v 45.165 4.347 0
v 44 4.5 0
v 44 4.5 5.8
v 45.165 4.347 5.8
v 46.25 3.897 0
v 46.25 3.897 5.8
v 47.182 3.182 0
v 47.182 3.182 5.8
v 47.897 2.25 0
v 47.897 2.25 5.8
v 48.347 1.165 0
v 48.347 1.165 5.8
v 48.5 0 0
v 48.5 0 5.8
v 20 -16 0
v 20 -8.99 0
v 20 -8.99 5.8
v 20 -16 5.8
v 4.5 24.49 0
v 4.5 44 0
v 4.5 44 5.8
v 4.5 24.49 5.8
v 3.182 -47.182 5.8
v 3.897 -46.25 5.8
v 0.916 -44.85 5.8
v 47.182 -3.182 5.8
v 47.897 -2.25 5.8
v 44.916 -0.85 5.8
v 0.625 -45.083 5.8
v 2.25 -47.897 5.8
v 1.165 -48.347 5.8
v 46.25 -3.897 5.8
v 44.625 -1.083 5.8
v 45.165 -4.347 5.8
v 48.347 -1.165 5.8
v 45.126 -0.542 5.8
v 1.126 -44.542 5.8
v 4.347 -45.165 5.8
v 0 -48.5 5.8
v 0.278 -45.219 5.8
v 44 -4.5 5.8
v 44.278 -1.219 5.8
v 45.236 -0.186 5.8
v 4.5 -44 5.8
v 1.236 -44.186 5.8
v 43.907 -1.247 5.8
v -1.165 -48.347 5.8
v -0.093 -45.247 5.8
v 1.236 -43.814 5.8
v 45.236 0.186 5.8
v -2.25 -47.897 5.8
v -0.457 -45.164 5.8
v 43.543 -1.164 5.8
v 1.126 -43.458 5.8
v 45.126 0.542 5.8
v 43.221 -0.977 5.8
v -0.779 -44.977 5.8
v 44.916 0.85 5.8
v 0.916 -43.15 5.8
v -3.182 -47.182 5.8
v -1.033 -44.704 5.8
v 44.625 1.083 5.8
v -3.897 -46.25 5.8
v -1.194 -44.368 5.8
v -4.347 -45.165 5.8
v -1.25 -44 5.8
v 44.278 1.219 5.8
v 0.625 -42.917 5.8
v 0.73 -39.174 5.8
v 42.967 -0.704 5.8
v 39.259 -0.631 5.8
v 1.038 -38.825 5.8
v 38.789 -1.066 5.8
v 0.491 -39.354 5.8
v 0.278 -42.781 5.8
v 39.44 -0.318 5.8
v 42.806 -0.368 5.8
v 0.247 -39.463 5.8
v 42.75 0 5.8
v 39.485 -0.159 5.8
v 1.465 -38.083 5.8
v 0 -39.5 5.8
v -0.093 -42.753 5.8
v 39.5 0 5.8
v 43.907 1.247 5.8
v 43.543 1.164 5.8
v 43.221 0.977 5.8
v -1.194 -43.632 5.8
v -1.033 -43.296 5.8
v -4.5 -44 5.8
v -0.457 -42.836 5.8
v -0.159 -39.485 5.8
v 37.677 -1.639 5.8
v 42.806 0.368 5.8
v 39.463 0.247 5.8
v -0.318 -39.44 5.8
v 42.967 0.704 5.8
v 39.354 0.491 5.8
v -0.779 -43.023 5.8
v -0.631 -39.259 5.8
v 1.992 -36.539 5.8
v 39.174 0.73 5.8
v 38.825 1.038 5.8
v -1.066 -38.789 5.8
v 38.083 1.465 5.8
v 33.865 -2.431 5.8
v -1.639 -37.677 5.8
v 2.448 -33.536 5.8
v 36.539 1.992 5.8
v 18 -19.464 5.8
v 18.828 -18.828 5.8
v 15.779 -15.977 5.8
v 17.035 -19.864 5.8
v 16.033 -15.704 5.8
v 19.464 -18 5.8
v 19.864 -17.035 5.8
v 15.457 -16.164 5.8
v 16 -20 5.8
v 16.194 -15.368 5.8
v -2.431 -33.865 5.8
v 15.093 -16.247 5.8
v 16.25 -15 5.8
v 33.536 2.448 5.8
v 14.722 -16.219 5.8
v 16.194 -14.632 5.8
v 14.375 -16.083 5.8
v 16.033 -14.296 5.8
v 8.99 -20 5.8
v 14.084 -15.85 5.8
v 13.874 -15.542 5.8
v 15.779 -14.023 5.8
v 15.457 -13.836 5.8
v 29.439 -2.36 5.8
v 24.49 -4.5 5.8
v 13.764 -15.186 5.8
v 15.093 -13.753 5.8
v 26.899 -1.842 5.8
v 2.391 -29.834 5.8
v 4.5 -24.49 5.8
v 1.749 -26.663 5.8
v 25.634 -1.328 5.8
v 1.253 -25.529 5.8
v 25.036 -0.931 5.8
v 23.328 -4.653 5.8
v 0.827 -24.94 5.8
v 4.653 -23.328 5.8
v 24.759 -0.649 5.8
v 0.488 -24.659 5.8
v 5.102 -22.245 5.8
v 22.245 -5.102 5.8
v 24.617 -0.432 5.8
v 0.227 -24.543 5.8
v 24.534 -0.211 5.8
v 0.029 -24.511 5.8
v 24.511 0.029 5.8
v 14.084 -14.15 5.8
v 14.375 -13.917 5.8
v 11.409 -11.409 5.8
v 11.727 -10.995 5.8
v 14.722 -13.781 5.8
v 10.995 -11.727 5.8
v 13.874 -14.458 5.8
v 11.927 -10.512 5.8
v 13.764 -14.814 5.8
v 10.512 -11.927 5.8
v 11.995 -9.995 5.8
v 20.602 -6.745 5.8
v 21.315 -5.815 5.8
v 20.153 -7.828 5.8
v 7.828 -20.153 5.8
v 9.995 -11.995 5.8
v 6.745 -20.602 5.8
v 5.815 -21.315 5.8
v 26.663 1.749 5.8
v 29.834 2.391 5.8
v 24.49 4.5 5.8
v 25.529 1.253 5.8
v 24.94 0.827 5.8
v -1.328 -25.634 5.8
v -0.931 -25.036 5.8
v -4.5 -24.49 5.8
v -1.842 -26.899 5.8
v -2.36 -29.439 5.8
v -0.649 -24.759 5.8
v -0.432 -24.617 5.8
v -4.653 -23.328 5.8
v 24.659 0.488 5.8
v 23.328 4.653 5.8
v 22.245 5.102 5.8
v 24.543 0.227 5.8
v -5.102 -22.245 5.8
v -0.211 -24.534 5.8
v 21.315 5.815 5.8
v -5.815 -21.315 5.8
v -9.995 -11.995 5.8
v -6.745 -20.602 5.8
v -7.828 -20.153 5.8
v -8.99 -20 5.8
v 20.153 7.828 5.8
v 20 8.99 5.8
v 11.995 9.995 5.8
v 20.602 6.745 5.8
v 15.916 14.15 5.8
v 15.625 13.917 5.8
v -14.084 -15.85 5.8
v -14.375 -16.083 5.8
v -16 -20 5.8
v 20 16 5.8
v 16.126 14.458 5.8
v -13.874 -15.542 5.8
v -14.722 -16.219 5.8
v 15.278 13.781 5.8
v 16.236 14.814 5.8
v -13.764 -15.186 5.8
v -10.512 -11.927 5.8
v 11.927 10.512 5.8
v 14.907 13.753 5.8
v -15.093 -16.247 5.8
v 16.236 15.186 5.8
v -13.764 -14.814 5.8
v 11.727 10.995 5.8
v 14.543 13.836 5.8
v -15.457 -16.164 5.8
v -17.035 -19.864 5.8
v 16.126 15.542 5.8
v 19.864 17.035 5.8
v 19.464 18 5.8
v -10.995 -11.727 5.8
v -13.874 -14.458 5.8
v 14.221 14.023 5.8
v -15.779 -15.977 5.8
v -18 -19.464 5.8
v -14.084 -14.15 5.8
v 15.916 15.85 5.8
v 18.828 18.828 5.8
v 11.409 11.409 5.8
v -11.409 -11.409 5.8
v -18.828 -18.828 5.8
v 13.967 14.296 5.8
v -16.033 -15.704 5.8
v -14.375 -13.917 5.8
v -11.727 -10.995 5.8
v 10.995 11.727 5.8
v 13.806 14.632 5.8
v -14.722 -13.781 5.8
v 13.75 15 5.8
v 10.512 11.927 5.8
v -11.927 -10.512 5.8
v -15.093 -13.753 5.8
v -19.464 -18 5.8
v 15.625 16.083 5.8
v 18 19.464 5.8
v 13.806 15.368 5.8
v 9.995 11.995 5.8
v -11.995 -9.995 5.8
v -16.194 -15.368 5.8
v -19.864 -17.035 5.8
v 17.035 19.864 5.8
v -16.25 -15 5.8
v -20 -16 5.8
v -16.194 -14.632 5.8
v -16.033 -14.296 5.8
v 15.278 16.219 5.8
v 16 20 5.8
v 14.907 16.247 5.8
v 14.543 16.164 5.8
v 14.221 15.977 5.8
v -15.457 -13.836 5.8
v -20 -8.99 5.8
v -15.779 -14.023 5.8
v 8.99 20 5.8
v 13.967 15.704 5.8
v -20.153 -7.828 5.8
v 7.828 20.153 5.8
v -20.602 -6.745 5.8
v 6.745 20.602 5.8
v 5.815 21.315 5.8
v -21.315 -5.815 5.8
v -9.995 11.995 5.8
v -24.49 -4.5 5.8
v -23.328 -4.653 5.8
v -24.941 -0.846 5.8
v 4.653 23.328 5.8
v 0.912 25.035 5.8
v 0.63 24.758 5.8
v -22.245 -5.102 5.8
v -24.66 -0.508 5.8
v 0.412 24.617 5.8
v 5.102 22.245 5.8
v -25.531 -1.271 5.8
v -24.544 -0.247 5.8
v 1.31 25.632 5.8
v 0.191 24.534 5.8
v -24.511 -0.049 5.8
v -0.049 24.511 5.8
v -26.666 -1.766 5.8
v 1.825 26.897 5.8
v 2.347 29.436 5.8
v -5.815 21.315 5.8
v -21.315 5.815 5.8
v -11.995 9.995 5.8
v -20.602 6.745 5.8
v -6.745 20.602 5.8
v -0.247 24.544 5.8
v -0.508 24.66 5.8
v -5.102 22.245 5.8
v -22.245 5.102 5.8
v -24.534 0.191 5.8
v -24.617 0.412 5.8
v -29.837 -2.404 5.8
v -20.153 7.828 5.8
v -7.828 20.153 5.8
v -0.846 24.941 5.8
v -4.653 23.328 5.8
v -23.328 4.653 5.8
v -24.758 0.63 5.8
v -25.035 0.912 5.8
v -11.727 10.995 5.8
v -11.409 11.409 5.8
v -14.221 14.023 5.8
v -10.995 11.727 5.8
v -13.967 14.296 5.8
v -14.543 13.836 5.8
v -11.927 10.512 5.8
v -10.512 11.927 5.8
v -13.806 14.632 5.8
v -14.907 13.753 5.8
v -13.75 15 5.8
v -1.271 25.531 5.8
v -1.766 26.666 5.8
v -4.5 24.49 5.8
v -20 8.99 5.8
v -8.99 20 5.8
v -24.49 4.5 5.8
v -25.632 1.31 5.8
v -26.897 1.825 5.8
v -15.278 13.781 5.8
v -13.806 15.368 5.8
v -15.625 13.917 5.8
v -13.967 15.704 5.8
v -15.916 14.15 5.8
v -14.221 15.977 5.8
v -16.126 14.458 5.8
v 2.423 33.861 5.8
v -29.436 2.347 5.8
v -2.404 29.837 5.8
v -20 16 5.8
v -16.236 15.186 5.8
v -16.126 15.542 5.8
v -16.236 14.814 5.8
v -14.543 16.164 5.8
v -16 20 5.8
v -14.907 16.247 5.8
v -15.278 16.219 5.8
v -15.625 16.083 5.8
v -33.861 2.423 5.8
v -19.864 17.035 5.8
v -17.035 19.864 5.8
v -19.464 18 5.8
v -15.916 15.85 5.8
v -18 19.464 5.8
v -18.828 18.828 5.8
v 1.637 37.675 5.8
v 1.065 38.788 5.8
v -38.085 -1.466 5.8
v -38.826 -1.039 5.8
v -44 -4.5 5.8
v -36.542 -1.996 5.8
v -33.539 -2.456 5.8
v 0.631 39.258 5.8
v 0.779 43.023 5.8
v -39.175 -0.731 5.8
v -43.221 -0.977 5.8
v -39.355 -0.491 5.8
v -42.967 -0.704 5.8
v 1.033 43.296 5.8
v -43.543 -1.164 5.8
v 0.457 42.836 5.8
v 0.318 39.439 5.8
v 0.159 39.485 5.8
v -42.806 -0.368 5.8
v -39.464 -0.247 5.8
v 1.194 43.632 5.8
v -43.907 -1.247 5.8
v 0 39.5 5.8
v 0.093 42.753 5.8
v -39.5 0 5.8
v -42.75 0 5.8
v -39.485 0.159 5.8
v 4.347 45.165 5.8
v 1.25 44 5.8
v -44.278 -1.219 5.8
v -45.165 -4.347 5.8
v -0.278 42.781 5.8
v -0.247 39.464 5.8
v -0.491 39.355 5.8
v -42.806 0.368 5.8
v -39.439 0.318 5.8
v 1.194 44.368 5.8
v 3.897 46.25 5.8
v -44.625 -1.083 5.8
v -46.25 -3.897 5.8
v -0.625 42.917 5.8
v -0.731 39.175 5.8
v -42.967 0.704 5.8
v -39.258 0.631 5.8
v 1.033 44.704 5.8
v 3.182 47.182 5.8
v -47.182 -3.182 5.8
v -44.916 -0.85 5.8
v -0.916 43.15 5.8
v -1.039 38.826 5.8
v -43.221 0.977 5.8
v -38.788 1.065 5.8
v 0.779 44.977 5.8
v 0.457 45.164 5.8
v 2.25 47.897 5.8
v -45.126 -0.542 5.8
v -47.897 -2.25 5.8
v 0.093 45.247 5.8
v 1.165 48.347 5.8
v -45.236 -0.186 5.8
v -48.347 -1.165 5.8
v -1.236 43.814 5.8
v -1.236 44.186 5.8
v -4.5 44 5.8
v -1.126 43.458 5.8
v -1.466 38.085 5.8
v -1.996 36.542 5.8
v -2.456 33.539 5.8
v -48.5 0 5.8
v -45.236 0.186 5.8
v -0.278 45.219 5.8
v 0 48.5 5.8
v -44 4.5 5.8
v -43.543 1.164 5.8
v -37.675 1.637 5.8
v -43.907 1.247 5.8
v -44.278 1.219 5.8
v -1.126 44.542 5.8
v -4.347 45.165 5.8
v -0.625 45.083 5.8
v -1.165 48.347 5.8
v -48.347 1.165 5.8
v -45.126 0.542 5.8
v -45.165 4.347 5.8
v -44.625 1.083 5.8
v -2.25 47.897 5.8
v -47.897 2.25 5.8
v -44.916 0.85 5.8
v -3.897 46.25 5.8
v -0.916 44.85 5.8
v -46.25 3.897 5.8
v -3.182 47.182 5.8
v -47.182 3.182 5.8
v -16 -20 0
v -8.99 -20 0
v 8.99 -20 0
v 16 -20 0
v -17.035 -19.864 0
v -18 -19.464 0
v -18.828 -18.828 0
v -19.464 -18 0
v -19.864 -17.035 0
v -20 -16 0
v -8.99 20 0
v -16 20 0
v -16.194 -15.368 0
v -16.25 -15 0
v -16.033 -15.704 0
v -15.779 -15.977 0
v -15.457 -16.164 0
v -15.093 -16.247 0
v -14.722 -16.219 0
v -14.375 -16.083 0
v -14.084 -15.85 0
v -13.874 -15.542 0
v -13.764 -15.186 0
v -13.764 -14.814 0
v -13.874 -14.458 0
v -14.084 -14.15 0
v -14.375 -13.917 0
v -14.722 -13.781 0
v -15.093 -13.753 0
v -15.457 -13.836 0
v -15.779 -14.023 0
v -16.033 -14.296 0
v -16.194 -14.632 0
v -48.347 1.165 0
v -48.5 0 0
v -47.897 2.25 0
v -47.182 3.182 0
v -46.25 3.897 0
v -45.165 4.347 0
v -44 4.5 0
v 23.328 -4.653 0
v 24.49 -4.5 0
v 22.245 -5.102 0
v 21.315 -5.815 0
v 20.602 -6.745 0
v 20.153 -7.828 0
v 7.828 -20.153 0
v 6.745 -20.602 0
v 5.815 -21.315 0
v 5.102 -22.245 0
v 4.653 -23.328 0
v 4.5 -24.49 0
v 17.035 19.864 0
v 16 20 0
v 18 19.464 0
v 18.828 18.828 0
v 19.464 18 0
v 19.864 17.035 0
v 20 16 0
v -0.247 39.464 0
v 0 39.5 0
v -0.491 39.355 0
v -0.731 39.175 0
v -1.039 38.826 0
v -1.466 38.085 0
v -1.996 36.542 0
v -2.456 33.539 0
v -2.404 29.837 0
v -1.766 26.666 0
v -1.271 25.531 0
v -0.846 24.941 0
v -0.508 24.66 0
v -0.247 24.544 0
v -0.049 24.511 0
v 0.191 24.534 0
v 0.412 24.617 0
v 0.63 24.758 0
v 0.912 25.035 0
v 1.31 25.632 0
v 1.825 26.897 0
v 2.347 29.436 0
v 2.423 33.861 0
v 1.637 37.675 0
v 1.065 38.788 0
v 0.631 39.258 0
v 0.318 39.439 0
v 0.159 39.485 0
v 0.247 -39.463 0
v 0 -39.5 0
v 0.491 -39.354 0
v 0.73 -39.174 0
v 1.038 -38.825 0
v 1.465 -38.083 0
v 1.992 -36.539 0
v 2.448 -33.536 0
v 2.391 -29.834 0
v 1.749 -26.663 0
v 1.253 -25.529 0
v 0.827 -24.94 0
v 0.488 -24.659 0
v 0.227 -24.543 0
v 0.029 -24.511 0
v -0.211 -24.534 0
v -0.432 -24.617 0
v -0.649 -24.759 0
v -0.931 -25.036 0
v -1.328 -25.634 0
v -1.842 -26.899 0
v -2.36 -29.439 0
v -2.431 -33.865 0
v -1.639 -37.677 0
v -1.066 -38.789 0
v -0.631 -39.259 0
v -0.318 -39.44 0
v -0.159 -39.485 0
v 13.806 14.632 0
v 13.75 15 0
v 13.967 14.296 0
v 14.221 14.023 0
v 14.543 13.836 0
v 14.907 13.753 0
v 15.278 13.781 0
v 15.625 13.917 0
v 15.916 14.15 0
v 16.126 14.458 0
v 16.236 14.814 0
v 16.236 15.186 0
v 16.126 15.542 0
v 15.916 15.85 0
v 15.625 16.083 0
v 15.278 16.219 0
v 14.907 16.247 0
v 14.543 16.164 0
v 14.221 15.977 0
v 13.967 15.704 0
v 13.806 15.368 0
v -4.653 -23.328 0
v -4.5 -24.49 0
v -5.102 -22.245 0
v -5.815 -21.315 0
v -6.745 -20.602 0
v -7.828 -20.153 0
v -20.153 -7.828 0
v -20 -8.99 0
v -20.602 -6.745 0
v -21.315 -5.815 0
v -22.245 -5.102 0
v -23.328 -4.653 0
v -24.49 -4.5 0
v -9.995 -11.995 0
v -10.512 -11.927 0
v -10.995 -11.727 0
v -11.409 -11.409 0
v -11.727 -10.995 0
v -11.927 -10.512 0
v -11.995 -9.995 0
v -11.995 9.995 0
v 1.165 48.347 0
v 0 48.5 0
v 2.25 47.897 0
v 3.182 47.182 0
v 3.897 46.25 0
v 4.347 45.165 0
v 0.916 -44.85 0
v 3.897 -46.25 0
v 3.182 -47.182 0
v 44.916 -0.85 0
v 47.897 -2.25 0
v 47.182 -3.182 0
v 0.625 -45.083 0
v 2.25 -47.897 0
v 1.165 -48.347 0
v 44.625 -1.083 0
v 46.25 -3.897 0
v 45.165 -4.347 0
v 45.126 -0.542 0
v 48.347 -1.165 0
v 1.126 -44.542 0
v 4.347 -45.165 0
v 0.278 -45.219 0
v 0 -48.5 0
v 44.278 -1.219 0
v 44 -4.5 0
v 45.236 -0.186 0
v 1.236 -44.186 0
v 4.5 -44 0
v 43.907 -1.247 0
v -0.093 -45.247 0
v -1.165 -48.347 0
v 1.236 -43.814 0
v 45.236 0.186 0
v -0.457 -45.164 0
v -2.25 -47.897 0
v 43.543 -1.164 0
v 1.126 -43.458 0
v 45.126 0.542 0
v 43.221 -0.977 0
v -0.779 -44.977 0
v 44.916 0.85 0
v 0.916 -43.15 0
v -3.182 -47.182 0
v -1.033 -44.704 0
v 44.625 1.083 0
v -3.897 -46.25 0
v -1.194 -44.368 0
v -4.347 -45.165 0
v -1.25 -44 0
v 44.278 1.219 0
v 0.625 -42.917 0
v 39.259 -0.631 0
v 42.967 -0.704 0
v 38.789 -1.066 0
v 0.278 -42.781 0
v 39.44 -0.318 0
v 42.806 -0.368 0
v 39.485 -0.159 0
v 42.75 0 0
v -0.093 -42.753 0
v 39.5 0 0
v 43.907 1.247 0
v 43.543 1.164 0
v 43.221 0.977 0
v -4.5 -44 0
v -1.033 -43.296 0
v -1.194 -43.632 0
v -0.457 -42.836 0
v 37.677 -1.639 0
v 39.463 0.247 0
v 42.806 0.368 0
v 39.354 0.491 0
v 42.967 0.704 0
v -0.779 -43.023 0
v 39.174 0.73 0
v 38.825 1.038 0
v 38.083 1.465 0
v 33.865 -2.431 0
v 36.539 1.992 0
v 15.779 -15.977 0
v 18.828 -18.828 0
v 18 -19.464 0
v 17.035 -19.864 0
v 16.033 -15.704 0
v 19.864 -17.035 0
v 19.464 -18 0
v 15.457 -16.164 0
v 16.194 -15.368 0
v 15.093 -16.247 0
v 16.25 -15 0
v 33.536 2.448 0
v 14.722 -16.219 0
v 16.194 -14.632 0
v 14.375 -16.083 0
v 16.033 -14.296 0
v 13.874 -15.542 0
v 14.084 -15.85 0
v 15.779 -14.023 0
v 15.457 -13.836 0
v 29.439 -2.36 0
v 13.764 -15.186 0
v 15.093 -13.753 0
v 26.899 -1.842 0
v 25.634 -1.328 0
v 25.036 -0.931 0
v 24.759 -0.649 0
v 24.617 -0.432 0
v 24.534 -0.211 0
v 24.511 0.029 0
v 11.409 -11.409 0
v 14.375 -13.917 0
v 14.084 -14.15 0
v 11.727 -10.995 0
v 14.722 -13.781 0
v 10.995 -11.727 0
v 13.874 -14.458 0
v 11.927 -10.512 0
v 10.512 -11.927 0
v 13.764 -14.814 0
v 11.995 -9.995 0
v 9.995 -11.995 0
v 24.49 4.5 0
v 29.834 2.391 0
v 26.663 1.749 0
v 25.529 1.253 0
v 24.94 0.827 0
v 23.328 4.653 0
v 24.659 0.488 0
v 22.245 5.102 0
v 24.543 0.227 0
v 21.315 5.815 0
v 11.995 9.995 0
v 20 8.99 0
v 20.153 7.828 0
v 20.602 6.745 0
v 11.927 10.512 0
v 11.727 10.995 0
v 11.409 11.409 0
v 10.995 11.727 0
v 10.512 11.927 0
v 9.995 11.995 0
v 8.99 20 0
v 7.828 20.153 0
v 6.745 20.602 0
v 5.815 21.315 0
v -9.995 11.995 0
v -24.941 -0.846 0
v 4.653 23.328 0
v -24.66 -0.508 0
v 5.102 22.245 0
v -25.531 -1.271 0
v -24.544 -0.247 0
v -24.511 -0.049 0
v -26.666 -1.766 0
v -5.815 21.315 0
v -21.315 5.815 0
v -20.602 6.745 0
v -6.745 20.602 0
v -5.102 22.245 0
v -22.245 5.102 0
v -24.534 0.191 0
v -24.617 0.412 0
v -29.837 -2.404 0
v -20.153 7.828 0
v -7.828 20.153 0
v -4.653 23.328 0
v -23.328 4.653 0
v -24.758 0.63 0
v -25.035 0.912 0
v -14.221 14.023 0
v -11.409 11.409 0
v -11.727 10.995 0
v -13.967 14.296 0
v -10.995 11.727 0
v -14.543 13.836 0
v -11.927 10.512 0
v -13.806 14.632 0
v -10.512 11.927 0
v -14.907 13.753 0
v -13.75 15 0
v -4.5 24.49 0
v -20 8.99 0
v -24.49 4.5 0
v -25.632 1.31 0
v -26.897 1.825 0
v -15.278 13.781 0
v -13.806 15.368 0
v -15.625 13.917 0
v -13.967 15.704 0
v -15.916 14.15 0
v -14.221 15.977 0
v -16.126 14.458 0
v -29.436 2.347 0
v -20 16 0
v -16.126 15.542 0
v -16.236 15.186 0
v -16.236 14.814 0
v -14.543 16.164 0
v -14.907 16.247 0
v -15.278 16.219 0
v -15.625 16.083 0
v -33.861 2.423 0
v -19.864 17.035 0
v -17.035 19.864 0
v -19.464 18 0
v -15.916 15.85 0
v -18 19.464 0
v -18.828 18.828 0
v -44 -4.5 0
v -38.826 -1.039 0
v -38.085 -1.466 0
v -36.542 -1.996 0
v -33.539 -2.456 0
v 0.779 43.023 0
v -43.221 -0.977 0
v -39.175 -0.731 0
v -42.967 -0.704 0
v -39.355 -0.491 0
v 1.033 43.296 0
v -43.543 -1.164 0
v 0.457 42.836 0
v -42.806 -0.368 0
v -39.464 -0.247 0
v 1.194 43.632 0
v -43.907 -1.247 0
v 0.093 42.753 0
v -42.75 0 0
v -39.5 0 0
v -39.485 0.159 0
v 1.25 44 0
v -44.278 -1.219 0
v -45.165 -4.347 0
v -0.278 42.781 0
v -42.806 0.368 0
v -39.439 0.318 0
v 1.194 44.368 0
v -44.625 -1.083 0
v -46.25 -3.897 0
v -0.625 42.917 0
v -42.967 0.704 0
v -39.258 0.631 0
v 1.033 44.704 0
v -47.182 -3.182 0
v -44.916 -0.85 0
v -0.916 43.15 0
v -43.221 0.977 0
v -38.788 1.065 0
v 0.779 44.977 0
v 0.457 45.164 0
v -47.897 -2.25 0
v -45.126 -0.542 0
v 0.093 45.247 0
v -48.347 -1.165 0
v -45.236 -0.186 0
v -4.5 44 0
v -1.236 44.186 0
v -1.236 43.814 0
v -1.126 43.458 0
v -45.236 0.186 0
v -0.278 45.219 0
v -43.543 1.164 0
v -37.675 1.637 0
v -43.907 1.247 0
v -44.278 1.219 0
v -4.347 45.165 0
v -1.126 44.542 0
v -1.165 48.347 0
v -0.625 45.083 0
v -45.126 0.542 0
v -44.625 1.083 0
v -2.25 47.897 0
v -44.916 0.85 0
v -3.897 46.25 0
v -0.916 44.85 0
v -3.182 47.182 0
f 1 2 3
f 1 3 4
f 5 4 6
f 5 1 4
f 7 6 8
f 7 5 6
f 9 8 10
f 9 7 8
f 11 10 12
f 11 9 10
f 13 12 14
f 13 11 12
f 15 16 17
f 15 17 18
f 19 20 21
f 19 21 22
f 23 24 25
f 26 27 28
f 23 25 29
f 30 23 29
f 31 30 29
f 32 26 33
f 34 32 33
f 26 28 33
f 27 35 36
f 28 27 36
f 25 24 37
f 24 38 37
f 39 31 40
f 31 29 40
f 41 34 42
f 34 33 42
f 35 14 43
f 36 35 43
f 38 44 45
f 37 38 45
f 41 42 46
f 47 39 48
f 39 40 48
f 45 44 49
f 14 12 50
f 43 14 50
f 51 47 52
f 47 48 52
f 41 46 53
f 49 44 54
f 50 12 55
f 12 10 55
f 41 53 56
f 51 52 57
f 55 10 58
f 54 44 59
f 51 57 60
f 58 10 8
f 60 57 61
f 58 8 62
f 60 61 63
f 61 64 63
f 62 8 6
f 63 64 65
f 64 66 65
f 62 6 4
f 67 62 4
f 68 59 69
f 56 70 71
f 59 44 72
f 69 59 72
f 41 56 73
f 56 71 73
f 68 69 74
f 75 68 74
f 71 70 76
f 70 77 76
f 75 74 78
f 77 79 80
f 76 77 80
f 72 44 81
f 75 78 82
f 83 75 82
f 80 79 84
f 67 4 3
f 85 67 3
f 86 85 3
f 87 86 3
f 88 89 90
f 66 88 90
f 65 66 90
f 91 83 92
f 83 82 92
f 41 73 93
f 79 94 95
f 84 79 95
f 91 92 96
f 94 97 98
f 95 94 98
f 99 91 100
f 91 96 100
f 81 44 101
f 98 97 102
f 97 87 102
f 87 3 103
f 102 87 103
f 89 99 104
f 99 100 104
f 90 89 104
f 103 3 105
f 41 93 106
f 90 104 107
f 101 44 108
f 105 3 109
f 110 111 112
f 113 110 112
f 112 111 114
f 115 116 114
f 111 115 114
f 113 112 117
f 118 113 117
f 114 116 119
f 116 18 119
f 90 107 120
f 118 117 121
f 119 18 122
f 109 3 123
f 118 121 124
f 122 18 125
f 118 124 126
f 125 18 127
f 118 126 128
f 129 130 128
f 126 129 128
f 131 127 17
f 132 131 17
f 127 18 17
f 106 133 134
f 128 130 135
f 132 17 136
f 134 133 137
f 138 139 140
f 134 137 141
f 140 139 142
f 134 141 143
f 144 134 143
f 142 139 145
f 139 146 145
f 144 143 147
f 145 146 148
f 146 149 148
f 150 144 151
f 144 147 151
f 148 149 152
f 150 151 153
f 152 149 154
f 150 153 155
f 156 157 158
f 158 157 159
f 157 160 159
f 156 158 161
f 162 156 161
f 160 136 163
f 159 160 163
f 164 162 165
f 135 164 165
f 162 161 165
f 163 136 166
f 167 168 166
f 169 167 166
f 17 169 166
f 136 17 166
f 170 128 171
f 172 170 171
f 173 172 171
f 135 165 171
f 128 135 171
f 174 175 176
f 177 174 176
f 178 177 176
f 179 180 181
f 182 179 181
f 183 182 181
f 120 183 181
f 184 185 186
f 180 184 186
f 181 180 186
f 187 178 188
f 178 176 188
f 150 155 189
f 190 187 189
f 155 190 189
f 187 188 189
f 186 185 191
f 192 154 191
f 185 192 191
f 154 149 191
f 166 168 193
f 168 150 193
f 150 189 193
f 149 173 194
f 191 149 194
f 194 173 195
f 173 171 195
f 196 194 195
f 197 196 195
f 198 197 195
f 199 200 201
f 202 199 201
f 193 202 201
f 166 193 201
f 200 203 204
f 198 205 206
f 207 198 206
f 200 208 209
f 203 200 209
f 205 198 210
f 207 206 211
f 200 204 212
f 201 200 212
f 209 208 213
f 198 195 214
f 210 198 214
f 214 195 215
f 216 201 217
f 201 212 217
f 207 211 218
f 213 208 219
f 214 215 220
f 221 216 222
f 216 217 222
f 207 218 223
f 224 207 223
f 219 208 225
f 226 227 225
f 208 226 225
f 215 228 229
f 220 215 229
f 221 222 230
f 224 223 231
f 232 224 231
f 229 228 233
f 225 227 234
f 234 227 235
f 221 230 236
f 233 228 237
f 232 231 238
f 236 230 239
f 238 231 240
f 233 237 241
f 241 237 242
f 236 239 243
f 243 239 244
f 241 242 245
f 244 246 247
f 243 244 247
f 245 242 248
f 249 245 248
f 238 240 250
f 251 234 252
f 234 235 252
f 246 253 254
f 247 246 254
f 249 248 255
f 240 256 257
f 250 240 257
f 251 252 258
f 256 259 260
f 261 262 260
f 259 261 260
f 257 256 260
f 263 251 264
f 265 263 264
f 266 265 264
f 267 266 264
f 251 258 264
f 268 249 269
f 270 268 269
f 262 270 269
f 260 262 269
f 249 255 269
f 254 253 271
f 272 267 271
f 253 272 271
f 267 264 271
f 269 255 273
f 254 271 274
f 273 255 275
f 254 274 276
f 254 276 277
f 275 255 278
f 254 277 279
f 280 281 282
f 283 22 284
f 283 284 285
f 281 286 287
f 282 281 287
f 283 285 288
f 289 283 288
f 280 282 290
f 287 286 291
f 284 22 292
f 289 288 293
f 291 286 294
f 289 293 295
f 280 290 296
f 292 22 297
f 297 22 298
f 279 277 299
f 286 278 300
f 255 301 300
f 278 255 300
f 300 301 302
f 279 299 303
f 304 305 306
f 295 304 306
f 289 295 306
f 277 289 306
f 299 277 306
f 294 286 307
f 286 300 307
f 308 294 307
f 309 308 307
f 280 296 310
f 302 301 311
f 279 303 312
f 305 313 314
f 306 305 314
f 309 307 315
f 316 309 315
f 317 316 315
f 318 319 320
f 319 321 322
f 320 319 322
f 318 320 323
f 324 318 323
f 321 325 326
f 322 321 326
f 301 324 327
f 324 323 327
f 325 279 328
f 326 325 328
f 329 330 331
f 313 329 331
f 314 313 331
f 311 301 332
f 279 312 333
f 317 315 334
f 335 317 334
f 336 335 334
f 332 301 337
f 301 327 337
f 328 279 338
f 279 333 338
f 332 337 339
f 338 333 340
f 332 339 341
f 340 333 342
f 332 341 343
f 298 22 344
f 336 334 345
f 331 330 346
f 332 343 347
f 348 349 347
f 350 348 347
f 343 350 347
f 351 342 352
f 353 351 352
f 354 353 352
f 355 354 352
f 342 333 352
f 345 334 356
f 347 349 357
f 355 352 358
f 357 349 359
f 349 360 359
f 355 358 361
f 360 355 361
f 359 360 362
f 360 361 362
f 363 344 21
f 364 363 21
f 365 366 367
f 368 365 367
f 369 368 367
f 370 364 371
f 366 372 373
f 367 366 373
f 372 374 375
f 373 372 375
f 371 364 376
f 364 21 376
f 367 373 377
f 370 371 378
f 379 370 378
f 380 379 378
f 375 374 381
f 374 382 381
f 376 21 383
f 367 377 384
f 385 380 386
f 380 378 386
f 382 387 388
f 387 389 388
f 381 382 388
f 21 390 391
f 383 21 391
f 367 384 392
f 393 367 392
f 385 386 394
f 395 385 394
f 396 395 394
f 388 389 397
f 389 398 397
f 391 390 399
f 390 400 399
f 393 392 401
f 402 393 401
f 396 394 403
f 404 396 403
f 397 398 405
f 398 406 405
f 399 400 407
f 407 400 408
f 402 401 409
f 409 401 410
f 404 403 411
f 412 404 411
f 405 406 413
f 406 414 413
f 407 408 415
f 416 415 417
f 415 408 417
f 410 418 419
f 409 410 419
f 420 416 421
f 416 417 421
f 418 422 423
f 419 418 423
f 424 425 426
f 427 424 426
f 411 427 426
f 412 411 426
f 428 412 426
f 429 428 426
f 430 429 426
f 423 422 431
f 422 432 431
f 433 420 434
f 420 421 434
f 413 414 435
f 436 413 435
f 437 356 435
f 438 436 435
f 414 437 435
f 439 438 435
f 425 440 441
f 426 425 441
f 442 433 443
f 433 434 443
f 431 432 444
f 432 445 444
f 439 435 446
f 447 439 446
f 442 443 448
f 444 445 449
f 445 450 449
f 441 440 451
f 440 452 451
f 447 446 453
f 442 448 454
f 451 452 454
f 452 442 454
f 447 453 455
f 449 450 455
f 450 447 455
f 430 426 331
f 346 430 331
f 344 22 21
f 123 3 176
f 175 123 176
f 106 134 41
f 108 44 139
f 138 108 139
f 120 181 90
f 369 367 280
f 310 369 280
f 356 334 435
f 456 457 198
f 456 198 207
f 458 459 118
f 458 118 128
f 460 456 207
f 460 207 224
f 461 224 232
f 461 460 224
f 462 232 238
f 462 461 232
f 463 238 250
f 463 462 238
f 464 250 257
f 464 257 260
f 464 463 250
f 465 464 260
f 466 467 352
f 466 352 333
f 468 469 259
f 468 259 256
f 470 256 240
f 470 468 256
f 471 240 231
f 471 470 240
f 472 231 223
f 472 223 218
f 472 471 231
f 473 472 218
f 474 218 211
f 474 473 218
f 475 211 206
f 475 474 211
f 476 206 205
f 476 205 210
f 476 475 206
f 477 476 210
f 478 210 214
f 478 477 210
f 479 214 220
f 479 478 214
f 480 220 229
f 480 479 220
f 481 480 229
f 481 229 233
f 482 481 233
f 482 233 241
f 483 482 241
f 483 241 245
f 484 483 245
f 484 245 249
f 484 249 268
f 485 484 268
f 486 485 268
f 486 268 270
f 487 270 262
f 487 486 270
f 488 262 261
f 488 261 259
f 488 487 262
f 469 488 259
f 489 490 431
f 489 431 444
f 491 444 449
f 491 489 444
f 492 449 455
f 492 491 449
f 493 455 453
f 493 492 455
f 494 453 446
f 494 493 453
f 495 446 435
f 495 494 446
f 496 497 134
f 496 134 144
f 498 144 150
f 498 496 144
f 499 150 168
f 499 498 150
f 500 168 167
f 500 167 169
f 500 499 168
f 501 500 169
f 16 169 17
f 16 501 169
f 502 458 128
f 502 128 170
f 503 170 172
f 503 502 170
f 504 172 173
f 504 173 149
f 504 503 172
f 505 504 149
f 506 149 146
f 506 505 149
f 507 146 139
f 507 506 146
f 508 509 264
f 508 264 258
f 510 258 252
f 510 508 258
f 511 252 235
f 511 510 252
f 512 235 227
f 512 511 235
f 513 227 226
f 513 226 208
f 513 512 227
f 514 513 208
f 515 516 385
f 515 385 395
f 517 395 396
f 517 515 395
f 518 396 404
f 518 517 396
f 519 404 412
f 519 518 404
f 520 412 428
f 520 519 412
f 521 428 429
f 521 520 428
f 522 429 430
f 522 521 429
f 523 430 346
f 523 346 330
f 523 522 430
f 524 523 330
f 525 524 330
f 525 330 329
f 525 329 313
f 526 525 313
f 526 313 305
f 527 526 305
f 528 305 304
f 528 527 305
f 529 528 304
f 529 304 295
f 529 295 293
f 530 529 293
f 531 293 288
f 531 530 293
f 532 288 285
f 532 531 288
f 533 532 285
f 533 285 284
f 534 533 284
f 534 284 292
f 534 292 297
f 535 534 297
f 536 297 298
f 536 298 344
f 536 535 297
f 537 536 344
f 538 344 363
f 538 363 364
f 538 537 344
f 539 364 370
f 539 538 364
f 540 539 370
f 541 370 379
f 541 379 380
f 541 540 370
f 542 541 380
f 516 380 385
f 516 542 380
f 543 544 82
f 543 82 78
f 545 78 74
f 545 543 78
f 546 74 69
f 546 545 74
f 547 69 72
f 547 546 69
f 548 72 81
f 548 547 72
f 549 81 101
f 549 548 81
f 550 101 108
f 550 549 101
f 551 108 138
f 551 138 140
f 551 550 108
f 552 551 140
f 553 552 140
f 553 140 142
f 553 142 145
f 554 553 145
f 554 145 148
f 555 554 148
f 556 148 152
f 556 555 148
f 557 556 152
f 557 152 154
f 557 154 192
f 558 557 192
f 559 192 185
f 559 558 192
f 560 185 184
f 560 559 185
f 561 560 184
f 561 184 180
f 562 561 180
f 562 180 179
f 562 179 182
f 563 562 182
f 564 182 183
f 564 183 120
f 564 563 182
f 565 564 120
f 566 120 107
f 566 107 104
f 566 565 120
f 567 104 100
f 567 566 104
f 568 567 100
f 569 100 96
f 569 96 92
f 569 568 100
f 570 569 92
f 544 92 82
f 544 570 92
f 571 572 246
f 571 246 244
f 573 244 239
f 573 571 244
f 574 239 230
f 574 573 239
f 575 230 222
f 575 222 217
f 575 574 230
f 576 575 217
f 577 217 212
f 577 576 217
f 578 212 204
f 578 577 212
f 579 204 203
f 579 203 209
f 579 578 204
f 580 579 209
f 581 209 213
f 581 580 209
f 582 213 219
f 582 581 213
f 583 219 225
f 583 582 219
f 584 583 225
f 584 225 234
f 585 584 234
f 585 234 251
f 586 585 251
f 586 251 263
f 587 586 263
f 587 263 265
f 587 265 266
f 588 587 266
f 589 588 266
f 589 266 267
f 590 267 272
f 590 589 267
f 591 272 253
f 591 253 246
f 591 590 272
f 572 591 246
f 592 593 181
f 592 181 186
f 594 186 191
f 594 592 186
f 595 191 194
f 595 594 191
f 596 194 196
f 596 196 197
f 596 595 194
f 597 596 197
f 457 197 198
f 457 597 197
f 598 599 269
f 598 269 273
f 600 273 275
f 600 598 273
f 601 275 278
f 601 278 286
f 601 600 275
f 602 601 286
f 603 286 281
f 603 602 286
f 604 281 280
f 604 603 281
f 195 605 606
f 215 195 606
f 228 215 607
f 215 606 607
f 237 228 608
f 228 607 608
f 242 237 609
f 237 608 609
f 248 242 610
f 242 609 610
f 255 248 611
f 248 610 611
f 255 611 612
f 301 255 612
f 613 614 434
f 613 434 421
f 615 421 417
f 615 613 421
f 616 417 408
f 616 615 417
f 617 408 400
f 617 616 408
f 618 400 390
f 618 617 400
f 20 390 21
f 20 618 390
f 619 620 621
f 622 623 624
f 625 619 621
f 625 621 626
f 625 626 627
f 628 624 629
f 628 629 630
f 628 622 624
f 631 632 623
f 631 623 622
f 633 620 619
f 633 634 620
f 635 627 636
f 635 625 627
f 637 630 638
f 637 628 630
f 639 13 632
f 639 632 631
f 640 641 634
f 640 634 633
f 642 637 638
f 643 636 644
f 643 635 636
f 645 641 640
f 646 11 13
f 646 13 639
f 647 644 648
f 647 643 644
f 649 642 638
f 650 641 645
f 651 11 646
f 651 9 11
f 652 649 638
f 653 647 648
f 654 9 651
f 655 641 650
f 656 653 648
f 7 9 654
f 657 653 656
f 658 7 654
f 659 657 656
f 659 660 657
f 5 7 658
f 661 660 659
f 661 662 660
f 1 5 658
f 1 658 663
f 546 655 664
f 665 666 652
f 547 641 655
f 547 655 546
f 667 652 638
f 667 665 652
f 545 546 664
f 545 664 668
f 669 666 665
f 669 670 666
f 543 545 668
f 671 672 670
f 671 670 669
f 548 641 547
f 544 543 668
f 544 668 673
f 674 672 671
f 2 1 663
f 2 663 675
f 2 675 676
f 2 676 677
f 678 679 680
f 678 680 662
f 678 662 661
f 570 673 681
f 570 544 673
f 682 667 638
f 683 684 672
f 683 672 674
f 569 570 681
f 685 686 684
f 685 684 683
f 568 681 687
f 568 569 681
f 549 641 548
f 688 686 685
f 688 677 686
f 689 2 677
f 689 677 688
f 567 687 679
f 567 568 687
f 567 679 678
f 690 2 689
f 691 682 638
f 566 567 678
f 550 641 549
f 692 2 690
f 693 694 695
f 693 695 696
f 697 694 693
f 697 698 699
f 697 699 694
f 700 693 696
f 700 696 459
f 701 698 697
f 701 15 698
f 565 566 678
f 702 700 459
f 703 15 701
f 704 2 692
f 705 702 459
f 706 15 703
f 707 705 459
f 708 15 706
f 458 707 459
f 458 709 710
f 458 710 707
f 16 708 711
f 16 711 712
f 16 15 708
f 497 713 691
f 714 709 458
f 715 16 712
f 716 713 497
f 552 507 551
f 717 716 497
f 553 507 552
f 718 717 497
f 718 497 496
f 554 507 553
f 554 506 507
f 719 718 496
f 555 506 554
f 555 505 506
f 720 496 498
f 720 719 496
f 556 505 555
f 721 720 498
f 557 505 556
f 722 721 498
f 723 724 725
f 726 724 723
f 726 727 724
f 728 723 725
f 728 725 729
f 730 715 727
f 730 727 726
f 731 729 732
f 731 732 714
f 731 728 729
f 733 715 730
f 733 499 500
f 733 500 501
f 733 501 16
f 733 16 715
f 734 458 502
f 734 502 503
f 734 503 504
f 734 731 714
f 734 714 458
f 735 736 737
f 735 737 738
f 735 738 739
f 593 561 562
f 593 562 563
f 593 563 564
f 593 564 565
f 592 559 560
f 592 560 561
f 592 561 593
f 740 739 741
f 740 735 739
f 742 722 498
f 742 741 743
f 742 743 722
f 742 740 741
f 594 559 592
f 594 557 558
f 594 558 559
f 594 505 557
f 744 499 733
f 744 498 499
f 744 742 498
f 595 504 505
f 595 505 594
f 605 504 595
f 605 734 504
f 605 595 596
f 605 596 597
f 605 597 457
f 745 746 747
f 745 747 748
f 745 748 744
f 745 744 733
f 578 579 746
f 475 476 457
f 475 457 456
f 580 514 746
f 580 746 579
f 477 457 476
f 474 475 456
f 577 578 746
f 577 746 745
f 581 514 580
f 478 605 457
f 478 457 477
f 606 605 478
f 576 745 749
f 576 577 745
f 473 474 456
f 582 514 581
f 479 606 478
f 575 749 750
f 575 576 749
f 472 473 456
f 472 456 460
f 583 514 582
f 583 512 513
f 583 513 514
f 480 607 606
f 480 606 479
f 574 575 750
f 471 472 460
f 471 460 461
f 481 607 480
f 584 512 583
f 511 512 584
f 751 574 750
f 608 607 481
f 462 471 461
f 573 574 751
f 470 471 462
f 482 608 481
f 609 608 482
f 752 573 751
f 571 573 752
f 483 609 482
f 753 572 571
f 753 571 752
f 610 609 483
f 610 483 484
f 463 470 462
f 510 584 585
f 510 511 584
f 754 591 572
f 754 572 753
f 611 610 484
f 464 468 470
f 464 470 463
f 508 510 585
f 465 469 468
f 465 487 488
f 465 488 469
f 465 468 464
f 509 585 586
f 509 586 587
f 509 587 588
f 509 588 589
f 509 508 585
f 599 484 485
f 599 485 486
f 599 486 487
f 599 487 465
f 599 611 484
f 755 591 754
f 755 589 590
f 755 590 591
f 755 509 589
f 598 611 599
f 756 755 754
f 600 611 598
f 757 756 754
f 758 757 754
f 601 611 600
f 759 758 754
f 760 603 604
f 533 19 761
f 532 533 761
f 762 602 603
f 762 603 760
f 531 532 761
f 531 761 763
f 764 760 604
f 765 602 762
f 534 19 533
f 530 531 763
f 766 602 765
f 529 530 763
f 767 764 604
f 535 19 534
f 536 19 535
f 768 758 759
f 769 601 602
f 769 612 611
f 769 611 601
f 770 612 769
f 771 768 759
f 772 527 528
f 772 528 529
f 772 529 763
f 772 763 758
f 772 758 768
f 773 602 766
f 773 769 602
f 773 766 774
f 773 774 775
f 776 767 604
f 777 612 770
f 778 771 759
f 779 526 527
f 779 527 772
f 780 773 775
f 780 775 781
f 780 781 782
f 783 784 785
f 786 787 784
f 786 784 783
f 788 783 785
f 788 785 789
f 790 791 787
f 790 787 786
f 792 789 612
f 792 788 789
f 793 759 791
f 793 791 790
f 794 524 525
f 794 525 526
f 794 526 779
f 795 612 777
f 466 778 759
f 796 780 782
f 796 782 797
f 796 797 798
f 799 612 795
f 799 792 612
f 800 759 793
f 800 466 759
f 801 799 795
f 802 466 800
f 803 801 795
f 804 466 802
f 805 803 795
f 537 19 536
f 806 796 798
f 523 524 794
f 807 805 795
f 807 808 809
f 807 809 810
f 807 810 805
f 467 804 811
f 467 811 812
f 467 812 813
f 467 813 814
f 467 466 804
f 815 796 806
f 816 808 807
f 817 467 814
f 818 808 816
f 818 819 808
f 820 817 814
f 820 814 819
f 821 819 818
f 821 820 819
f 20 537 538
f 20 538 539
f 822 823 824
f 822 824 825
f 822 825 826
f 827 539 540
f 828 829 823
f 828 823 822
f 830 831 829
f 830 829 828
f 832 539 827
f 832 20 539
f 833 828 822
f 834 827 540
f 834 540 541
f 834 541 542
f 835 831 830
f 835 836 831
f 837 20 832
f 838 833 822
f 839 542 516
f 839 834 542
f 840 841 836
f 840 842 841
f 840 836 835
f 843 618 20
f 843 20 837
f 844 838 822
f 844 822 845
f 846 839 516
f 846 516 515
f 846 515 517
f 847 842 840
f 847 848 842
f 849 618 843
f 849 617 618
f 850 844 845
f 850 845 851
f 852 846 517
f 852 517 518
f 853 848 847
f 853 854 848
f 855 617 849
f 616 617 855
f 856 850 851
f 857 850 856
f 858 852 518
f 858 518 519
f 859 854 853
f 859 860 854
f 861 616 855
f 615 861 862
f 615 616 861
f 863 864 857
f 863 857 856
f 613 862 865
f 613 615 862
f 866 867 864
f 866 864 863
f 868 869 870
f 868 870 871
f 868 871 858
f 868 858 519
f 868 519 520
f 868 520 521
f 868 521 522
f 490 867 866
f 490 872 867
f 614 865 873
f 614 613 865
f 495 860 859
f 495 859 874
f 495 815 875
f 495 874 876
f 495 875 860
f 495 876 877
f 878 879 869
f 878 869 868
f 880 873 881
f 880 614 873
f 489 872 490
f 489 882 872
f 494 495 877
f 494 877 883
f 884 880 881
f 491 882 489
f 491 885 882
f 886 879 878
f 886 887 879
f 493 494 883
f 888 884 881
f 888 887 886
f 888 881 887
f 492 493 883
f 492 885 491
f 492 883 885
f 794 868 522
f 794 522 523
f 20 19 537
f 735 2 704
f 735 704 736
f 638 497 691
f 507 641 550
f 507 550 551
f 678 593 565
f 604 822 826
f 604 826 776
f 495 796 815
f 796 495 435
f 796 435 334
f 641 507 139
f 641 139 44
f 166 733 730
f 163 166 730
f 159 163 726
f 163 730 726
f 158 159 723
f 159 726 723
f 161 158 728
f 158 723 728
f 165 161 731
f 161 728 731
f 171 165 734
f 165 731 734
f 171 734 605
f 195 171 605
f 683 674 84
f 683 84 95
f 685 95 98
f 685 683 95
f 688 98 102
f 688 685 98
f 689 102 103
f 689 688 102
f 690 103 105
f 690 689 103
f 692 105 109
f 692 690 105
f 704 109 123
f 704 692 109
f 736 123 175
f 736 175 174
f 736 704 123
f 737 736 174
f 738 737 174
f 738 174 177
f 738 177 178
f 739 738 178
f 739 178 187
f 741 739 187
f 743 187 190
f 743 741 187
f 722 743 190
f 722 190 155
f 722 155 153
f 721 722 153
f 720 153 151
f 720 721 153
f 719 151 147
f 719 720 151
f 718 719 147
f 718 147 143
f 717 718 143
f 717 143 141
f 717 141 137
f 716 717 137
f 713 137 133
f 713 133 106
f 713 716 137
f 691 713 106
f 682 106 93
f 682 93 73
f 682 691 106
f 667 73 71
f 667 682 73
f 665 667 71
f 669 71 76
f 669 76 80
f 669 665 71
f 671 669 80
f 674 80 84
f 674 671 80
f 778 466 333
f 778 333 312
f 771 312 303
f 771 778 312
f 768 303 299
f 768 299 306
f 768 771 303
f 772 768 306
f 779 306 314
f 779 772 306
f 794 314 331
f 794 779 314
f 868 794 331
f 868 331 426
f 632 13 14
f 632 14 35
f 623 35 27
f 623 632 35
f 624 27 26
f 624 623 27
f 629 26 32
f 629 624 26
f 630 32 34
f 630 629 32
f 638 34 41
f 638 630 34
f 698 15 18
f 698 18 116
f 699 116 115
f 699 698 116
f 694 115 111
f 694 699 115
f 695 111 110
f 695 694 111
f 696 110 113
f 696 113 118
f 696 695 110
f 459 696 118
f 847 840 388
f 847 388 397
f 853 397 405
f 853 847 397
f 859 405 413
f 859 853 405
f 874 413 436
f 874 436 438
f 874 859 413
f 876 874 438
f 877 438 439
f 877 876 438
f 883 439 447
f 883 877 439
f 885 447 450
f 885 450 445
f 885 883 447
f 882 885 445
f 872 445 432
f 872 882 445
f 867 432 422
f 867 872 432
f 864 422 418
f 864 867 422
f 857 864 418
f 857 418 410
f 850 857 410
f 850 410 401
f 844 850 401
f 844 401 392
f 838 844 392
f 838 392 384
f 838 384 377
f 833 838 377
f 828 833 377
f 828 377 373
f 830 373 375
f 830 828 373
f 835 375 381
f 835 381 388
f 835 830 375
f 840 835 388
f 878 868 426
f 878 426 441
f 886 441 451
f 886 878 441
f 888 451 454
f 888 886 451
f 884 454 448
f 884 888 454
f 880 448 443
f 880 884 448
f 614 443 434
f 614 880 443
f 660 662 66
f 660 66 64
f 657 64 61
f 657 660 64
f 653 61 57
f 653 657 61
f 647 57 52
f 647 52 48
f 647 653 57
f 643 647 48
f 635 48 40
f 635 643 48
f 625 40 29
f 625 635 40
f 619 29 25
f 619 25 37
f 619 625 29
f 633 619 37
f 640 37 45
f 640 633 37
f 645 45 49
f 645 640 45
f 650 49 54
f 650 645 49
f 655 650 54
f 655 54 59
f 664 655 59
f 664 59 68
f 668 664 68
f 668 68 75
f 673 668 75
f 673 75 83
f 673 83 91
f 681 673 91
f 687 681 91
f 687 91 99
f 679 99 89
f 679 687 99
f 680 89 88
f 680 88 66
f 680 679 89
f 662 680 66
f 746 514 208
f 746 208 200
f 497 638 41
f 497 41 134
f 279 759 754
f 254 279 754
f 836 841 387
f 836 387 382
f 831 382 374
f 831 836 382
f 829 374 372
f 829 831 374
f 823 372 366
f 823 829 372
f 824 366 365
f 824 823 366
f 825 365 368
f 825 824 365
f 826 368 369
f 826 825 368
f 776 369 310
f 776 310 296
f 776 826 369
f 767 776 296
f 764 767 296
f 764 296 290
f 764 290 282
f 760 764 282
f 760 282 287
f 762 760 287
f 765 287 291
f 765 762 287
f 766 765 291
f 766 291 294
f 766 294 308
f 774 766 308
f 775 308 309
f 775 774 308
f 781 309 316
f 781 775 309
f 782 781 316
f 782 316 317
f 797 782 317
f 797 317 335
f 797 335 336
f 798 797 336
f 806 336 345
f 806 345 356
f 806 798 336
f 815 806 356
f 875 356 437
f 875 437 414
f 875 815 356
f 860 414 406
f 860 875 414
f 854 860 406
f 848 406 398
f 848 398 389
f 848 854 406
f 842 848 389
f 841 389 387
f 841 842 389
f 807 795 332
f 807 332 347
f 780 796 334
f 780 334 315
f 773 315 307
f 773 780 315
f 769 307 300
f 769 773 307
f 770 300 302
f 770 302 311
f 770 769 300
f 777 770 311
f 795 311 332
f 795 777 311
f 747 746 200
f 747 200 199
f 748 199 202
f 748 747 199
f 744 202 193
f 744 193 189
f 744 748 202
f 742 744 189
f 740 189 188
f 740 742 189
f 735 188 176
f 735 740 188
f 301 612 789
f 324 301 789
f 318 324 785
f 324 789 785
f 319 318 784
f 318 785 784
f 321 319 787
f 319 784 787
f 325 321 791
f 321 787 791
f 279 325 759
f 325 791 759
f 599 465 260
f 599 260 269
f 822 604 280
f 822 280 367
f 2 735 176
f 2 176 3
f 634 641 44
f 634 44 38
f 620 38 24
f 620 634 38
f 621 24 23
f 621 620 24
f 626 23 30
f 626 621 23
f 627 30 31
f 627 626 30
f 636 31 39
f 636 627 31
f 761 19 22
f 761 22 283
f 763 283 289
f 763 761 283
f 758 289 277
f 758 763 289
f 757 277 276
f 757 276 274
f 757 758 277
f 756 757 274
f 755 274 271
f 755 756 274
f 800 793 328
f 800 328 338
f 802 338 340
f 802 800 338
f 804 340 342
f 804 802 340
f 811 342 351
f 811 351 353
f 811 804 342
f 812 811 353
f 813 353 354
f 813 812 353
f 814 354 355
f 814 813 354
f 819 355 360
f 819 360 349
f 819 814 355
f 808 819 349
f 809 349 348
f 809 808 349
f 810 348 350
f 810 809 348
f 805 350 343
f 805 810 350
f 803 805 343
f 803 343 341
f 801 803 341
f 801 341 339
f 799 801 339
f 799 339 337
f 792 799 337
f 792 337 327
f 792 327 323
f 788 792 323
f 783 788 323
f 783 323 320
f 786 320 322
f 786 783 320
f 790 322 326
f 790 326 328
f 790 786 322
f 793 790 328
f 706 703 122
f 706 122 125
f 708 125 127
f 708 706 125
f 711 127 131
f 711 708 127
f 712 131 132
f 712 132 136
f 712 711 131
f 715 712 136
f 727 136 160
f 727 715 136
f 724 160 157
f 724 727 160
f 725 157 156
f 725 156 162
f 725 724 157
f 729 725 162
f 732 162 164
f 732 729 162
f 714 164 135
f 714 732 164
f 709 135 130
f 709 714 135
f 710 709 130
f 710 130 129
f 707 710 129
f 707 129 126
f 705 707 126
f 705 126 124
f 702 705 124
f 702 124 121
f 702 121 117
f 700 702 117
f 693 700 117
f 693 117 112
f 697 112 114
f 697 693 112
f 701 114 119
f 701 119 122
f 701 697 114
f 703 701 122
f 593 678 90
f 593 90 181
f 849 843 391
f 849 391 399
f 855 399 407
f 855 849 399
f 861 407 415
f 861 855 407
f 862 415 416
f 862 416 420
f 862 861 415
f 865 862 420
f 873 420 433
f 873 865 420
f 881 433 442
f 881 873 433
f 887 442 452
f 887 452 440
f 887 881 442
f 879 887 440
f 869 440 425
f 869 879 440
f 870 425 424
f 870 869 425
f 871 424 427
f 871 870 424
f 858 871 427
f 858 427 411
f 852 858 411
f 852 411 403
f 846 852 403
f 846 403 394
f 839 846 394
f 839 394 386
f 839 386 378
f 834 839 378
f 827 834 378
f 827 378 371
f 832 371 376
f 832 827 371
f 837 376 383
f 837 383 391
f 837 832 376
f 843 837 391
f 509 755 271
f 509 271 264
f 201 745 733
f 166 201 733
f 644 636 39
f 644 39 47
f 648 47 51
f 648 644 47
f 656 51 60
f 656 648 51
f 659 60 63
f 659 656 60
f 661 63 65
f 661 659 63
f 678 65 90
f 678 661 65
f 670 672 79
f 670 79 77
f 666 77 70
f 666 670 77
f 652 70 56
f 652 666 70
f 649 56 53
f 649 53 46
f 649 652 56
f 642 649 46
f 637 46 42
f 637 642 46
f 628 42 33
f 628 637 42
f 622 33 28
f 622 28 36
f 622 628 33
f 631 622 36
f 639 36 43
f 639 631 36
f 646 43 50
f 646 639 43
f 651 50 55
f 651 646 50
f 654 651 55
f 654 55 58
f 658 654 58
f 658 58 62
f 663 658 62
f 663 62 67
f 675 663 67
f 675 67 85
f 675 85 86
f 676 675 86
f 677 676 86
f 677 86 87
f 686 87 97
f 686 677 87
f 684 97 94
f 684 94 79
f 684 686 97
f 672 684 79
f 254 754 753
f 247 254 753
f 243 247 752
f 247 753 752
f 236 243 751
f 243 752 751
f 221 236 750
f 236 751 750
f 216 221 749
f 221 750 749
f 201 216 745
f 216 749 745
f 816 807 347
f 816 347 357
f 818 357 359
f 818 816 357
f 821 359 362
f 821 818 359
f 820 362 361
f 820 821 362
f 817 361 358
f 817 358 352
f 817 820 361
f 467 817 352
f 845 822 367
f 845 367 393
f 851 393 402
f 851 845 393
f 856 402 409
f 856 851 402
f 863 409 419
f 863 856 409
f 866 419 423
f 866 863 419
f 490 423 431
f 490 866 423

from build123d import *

# Parameters (mm, degrees)
SKETCH1_R           = 1.25
SKETCH1_RX          = 7.495001668
SKETCH1_RY          = 2.505000234
BOSS_EXTRUDE1_DEPTH = 5.8


with BuildPart() as part:
    # Sketch1 → Boss-Extrude1 (new body)
    with BuildSketch(Plane.XY):
        with BuildLine():
            Line((-16, 20), (-8.99, 20))
            ThreePointArc((-8.99, 20), (-5.815090552, 21.315090552), (-4.5, 24.49))
            Line((-4.5, 24.49), (-4.5, 44))
            ThreePointArc((-4.5, 44), (-3.181980515, 47.181980515), (0, 48.5))
            ThreePointArc((0, 48.5), (3.181980515, 47.181980515), (4.5, 44))
            Line((4.5, 44), (4.5, 24.49))
            ThreePointArc((4.5, 24.49), (5.815090552, 21.315090552), (8.99, 20))
            Line((8.99, 20), (16, 20))
            ThreePointArc((16, 20), (18.828427125, 18.828427125), (20, 16))
            Line((20, 16), (20, 8.99))
            ThreePointArc((20, 8.99), (21.315090552, 5.815090552), (24.49, 4.5))
            Line((24.49, 4.5), (44, 4.5))
            ThreePointArc((44, 4.5), (47.181980515, 3.181980515), (48.5, 0))
            ThreePointArc((48.5, 0), (47.181980515, -3.181980515), (44, -4.5))
            Line((44, -4.5), (24.49, -4.5))
            ThreePointArc((24.49, -4.5), (21.315090552, -5.815090552), (20, -8.99))
            Line((20, -8.99), (20, -16))
            ThreePointArc((20, -16), (18.828427125, -18.828427125), (16, -20))
            Line((16, -20), (8.99, -20))
            ThreePointArc((8.99, -20), (5.815090552, -21.315090552), (4.5, -24.49))
            Line((4.5, -24.49), (4.5, -44))
            ThreePointArc((4.5, -44), (3.181980515, -47.181980515), (0, -48.5))
            ThreePointArc((0, -48.5), (-3.181980515, -47.181980515), (-4.5, -44))
            Line((-4.5, -44), (-4.5, -24.49))
            ThreePointArc((-4.5, -24.49), (-5.815090552, -21.315090552), (-8.99, -20))
            Line((-8.99, -20), (-16, -20))
            ThreePointArc((-16, -20), (-18.828427125, -18.828427125), (-20, -16))
            Line((-20, -16), (-20, -8.99))
            ThreePointArc((-20, -8.99), (-21.315090552, -5.815090552), (-24.49, -4.5))
            Line((-24.49, -4.5), (-44, -4.5))
            ThreePointArc((-44, -4.5), (-47.181980515, -3.181980515), (-48.5, 0))
            ThreePointArc((-48.5, 0), (-47.181980515, 3.181980515), (-44, 4.5))
            Line((-44, 4.5), (-24.49, 4.5))
            ThreePointArc((-24.49, 4.5), (-21.315090552, 5.815090552), (-20, 8.99))
            Line((-20, 8.99), (-20, 16))
            ThreePointArc((-20, 16), (-18.828427125, 18.828427125), (-16, 20))
        make_face()
        with Locations((0, 44)):
            Circle(SKETCH1_R, mode=Mode.SUBTRACT)
        with Locations((-15, 15)):
            Circle(SKETCH1_R, mode=Mode.SUBTRACT)
        with Locations(Location((15, 15, 0), (0, 0, 180))):
            Circle(SKETCH1_R, mode=Mode.SUBTRACT)
        with Locations((15, -15)):
            Circle(SKETCH1_R, mode=Mode.SUBTRACT)
        with Locations(Location((-15, -15, 0), (0, 0, 180))):
            Circle(SKETCH1_R, mode=Mode.SUBTRACT)
        with Locations(Location((44, 0, 0), (0, 0, 180))):
            Circle(SKETCH1_R, mode=Mode.SUBTRACT)
        with Locations(Location((0, -44, 0), (0, 0, 180))):
            Circle(SKETCH1_R, mode=Mode.SUBTRACT)
        with Locations((-44, 0)):
            Circle(SKETCH1_R, mode=Mode.SUBTRACT)
        with Locations(Location((-0.004999676, 32.005), (0, 0, 89.961779812))):
            Ellipse(SKETCH1_RX, SKETCH1_RY, mode=Mode.SUBTRACT)
        with Locations(Location((32.005, -0.004999676), (0, 0, 0.038220188))):
            Ellipse(SKETCH1_RX, SKETCH1_RY, mode=Mode.SUBTRACT)
        with Locations(Location((-0.004999676, -32.005), (0, 0, -89.961779812))):
            Ellipse(SKETCH1_RX, SKETCH1_RY, mode=Mode.SUBTRACT)
        with Locations(Location((-32.005, -0.004999676), (0, 0, 179.961779812))):
            Ellipse(SKETCH1_RX, SKETCH1_RY, mode=Mode.SUBTRACT)
        with BuildLine():
            Line((9.99479618, -11.99479618), (-9.99479618, -11.99479618))
            ThreePointArc((-9.99479618, -11.99479618), (-11.409009742, -11.409009742), (-11.99479618, -9.99479618))
            Line((-11.99479618, -9.99479618), (-11.99479618, 9.99479618))
            ThreePointArc((-11.99479618, 9.99479618), (-11.409009742, 11.409009742), (-9.99479618, 11.99479618))
            Line((-9.99479618, 11.99479618), (9.99479618, 11.99479618))
            ThreePointArc((9.99479618, 11.99479618), (11.409009742, 11.409009742), (11.99479618, 9.99479618))
            Line((11.99479618, 9.99479618), (11.99479618, -9.99479618))
            ThreePointArc((11.99479618, -9.99479618), (11.409009742, -11.409009742), (9.99479618, -11.99479618))
        make_face(mode=Mode.SUBTRACT)
    extrude(amount=BOSS_EXTRUDE1_DEPTH)


solid = part.part
